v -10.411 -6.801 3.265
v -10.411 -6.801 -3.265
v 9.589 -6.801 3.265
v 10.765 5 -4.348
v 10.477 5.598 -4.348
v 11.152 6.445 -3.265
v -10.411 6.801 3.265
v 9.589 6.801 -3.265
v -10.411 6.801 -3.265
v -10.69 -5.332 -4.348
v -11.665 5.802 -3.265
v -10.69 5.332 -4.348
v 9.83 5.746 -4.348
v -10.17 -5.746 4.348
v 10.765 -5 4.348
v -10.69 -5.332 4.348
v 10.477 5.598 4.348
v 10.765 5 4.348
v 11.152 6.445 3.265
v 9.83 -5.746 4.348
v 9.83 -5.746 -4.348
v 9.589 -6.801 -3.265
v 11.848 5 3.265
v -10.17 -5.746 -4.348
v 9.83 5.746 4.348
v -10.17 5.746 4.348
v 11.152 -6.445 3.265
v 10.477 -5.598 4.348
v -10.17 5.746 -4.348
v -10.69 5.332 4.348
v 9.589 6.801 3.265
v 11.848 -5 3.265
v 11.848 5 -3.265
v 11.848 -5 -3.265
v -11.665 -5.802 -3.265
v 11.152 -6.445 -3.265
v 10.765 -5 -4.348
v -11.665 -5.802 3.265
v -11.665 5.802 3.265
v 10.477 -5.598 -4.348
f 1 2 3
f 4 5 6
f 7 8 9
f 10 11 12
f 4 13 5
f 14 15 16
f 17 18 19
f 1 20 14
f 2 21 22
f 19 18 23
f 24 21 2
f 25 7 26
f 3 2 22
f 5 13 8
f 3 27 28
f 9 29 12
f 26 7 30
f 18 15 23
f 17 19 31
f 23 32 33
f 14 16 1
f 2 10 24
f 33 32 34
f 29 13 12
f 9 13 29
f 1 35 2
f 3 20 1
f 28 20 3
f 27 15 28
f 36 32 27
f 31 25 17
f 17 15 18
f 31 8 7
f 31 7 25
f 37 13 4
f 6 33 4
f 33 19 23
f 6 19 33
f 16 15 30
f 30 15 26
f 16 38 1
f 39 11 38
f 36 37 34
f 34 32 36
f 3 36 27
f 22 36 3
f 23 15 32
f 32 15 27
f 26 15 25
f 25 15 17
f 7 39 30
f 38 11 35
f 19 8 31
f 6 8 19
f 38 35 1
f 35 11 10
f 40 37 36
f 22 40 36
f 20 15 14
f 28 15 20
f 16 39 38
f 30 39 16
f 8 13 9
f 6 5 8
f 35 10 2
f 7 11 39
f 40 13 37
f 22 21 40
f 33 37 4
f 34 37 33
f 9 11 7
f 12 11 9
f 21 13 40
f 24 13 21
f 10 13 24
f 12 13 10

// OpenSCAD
minkowski() {
  cube([20, 10, 5], center = true);
  sphere(r = 2);
}
